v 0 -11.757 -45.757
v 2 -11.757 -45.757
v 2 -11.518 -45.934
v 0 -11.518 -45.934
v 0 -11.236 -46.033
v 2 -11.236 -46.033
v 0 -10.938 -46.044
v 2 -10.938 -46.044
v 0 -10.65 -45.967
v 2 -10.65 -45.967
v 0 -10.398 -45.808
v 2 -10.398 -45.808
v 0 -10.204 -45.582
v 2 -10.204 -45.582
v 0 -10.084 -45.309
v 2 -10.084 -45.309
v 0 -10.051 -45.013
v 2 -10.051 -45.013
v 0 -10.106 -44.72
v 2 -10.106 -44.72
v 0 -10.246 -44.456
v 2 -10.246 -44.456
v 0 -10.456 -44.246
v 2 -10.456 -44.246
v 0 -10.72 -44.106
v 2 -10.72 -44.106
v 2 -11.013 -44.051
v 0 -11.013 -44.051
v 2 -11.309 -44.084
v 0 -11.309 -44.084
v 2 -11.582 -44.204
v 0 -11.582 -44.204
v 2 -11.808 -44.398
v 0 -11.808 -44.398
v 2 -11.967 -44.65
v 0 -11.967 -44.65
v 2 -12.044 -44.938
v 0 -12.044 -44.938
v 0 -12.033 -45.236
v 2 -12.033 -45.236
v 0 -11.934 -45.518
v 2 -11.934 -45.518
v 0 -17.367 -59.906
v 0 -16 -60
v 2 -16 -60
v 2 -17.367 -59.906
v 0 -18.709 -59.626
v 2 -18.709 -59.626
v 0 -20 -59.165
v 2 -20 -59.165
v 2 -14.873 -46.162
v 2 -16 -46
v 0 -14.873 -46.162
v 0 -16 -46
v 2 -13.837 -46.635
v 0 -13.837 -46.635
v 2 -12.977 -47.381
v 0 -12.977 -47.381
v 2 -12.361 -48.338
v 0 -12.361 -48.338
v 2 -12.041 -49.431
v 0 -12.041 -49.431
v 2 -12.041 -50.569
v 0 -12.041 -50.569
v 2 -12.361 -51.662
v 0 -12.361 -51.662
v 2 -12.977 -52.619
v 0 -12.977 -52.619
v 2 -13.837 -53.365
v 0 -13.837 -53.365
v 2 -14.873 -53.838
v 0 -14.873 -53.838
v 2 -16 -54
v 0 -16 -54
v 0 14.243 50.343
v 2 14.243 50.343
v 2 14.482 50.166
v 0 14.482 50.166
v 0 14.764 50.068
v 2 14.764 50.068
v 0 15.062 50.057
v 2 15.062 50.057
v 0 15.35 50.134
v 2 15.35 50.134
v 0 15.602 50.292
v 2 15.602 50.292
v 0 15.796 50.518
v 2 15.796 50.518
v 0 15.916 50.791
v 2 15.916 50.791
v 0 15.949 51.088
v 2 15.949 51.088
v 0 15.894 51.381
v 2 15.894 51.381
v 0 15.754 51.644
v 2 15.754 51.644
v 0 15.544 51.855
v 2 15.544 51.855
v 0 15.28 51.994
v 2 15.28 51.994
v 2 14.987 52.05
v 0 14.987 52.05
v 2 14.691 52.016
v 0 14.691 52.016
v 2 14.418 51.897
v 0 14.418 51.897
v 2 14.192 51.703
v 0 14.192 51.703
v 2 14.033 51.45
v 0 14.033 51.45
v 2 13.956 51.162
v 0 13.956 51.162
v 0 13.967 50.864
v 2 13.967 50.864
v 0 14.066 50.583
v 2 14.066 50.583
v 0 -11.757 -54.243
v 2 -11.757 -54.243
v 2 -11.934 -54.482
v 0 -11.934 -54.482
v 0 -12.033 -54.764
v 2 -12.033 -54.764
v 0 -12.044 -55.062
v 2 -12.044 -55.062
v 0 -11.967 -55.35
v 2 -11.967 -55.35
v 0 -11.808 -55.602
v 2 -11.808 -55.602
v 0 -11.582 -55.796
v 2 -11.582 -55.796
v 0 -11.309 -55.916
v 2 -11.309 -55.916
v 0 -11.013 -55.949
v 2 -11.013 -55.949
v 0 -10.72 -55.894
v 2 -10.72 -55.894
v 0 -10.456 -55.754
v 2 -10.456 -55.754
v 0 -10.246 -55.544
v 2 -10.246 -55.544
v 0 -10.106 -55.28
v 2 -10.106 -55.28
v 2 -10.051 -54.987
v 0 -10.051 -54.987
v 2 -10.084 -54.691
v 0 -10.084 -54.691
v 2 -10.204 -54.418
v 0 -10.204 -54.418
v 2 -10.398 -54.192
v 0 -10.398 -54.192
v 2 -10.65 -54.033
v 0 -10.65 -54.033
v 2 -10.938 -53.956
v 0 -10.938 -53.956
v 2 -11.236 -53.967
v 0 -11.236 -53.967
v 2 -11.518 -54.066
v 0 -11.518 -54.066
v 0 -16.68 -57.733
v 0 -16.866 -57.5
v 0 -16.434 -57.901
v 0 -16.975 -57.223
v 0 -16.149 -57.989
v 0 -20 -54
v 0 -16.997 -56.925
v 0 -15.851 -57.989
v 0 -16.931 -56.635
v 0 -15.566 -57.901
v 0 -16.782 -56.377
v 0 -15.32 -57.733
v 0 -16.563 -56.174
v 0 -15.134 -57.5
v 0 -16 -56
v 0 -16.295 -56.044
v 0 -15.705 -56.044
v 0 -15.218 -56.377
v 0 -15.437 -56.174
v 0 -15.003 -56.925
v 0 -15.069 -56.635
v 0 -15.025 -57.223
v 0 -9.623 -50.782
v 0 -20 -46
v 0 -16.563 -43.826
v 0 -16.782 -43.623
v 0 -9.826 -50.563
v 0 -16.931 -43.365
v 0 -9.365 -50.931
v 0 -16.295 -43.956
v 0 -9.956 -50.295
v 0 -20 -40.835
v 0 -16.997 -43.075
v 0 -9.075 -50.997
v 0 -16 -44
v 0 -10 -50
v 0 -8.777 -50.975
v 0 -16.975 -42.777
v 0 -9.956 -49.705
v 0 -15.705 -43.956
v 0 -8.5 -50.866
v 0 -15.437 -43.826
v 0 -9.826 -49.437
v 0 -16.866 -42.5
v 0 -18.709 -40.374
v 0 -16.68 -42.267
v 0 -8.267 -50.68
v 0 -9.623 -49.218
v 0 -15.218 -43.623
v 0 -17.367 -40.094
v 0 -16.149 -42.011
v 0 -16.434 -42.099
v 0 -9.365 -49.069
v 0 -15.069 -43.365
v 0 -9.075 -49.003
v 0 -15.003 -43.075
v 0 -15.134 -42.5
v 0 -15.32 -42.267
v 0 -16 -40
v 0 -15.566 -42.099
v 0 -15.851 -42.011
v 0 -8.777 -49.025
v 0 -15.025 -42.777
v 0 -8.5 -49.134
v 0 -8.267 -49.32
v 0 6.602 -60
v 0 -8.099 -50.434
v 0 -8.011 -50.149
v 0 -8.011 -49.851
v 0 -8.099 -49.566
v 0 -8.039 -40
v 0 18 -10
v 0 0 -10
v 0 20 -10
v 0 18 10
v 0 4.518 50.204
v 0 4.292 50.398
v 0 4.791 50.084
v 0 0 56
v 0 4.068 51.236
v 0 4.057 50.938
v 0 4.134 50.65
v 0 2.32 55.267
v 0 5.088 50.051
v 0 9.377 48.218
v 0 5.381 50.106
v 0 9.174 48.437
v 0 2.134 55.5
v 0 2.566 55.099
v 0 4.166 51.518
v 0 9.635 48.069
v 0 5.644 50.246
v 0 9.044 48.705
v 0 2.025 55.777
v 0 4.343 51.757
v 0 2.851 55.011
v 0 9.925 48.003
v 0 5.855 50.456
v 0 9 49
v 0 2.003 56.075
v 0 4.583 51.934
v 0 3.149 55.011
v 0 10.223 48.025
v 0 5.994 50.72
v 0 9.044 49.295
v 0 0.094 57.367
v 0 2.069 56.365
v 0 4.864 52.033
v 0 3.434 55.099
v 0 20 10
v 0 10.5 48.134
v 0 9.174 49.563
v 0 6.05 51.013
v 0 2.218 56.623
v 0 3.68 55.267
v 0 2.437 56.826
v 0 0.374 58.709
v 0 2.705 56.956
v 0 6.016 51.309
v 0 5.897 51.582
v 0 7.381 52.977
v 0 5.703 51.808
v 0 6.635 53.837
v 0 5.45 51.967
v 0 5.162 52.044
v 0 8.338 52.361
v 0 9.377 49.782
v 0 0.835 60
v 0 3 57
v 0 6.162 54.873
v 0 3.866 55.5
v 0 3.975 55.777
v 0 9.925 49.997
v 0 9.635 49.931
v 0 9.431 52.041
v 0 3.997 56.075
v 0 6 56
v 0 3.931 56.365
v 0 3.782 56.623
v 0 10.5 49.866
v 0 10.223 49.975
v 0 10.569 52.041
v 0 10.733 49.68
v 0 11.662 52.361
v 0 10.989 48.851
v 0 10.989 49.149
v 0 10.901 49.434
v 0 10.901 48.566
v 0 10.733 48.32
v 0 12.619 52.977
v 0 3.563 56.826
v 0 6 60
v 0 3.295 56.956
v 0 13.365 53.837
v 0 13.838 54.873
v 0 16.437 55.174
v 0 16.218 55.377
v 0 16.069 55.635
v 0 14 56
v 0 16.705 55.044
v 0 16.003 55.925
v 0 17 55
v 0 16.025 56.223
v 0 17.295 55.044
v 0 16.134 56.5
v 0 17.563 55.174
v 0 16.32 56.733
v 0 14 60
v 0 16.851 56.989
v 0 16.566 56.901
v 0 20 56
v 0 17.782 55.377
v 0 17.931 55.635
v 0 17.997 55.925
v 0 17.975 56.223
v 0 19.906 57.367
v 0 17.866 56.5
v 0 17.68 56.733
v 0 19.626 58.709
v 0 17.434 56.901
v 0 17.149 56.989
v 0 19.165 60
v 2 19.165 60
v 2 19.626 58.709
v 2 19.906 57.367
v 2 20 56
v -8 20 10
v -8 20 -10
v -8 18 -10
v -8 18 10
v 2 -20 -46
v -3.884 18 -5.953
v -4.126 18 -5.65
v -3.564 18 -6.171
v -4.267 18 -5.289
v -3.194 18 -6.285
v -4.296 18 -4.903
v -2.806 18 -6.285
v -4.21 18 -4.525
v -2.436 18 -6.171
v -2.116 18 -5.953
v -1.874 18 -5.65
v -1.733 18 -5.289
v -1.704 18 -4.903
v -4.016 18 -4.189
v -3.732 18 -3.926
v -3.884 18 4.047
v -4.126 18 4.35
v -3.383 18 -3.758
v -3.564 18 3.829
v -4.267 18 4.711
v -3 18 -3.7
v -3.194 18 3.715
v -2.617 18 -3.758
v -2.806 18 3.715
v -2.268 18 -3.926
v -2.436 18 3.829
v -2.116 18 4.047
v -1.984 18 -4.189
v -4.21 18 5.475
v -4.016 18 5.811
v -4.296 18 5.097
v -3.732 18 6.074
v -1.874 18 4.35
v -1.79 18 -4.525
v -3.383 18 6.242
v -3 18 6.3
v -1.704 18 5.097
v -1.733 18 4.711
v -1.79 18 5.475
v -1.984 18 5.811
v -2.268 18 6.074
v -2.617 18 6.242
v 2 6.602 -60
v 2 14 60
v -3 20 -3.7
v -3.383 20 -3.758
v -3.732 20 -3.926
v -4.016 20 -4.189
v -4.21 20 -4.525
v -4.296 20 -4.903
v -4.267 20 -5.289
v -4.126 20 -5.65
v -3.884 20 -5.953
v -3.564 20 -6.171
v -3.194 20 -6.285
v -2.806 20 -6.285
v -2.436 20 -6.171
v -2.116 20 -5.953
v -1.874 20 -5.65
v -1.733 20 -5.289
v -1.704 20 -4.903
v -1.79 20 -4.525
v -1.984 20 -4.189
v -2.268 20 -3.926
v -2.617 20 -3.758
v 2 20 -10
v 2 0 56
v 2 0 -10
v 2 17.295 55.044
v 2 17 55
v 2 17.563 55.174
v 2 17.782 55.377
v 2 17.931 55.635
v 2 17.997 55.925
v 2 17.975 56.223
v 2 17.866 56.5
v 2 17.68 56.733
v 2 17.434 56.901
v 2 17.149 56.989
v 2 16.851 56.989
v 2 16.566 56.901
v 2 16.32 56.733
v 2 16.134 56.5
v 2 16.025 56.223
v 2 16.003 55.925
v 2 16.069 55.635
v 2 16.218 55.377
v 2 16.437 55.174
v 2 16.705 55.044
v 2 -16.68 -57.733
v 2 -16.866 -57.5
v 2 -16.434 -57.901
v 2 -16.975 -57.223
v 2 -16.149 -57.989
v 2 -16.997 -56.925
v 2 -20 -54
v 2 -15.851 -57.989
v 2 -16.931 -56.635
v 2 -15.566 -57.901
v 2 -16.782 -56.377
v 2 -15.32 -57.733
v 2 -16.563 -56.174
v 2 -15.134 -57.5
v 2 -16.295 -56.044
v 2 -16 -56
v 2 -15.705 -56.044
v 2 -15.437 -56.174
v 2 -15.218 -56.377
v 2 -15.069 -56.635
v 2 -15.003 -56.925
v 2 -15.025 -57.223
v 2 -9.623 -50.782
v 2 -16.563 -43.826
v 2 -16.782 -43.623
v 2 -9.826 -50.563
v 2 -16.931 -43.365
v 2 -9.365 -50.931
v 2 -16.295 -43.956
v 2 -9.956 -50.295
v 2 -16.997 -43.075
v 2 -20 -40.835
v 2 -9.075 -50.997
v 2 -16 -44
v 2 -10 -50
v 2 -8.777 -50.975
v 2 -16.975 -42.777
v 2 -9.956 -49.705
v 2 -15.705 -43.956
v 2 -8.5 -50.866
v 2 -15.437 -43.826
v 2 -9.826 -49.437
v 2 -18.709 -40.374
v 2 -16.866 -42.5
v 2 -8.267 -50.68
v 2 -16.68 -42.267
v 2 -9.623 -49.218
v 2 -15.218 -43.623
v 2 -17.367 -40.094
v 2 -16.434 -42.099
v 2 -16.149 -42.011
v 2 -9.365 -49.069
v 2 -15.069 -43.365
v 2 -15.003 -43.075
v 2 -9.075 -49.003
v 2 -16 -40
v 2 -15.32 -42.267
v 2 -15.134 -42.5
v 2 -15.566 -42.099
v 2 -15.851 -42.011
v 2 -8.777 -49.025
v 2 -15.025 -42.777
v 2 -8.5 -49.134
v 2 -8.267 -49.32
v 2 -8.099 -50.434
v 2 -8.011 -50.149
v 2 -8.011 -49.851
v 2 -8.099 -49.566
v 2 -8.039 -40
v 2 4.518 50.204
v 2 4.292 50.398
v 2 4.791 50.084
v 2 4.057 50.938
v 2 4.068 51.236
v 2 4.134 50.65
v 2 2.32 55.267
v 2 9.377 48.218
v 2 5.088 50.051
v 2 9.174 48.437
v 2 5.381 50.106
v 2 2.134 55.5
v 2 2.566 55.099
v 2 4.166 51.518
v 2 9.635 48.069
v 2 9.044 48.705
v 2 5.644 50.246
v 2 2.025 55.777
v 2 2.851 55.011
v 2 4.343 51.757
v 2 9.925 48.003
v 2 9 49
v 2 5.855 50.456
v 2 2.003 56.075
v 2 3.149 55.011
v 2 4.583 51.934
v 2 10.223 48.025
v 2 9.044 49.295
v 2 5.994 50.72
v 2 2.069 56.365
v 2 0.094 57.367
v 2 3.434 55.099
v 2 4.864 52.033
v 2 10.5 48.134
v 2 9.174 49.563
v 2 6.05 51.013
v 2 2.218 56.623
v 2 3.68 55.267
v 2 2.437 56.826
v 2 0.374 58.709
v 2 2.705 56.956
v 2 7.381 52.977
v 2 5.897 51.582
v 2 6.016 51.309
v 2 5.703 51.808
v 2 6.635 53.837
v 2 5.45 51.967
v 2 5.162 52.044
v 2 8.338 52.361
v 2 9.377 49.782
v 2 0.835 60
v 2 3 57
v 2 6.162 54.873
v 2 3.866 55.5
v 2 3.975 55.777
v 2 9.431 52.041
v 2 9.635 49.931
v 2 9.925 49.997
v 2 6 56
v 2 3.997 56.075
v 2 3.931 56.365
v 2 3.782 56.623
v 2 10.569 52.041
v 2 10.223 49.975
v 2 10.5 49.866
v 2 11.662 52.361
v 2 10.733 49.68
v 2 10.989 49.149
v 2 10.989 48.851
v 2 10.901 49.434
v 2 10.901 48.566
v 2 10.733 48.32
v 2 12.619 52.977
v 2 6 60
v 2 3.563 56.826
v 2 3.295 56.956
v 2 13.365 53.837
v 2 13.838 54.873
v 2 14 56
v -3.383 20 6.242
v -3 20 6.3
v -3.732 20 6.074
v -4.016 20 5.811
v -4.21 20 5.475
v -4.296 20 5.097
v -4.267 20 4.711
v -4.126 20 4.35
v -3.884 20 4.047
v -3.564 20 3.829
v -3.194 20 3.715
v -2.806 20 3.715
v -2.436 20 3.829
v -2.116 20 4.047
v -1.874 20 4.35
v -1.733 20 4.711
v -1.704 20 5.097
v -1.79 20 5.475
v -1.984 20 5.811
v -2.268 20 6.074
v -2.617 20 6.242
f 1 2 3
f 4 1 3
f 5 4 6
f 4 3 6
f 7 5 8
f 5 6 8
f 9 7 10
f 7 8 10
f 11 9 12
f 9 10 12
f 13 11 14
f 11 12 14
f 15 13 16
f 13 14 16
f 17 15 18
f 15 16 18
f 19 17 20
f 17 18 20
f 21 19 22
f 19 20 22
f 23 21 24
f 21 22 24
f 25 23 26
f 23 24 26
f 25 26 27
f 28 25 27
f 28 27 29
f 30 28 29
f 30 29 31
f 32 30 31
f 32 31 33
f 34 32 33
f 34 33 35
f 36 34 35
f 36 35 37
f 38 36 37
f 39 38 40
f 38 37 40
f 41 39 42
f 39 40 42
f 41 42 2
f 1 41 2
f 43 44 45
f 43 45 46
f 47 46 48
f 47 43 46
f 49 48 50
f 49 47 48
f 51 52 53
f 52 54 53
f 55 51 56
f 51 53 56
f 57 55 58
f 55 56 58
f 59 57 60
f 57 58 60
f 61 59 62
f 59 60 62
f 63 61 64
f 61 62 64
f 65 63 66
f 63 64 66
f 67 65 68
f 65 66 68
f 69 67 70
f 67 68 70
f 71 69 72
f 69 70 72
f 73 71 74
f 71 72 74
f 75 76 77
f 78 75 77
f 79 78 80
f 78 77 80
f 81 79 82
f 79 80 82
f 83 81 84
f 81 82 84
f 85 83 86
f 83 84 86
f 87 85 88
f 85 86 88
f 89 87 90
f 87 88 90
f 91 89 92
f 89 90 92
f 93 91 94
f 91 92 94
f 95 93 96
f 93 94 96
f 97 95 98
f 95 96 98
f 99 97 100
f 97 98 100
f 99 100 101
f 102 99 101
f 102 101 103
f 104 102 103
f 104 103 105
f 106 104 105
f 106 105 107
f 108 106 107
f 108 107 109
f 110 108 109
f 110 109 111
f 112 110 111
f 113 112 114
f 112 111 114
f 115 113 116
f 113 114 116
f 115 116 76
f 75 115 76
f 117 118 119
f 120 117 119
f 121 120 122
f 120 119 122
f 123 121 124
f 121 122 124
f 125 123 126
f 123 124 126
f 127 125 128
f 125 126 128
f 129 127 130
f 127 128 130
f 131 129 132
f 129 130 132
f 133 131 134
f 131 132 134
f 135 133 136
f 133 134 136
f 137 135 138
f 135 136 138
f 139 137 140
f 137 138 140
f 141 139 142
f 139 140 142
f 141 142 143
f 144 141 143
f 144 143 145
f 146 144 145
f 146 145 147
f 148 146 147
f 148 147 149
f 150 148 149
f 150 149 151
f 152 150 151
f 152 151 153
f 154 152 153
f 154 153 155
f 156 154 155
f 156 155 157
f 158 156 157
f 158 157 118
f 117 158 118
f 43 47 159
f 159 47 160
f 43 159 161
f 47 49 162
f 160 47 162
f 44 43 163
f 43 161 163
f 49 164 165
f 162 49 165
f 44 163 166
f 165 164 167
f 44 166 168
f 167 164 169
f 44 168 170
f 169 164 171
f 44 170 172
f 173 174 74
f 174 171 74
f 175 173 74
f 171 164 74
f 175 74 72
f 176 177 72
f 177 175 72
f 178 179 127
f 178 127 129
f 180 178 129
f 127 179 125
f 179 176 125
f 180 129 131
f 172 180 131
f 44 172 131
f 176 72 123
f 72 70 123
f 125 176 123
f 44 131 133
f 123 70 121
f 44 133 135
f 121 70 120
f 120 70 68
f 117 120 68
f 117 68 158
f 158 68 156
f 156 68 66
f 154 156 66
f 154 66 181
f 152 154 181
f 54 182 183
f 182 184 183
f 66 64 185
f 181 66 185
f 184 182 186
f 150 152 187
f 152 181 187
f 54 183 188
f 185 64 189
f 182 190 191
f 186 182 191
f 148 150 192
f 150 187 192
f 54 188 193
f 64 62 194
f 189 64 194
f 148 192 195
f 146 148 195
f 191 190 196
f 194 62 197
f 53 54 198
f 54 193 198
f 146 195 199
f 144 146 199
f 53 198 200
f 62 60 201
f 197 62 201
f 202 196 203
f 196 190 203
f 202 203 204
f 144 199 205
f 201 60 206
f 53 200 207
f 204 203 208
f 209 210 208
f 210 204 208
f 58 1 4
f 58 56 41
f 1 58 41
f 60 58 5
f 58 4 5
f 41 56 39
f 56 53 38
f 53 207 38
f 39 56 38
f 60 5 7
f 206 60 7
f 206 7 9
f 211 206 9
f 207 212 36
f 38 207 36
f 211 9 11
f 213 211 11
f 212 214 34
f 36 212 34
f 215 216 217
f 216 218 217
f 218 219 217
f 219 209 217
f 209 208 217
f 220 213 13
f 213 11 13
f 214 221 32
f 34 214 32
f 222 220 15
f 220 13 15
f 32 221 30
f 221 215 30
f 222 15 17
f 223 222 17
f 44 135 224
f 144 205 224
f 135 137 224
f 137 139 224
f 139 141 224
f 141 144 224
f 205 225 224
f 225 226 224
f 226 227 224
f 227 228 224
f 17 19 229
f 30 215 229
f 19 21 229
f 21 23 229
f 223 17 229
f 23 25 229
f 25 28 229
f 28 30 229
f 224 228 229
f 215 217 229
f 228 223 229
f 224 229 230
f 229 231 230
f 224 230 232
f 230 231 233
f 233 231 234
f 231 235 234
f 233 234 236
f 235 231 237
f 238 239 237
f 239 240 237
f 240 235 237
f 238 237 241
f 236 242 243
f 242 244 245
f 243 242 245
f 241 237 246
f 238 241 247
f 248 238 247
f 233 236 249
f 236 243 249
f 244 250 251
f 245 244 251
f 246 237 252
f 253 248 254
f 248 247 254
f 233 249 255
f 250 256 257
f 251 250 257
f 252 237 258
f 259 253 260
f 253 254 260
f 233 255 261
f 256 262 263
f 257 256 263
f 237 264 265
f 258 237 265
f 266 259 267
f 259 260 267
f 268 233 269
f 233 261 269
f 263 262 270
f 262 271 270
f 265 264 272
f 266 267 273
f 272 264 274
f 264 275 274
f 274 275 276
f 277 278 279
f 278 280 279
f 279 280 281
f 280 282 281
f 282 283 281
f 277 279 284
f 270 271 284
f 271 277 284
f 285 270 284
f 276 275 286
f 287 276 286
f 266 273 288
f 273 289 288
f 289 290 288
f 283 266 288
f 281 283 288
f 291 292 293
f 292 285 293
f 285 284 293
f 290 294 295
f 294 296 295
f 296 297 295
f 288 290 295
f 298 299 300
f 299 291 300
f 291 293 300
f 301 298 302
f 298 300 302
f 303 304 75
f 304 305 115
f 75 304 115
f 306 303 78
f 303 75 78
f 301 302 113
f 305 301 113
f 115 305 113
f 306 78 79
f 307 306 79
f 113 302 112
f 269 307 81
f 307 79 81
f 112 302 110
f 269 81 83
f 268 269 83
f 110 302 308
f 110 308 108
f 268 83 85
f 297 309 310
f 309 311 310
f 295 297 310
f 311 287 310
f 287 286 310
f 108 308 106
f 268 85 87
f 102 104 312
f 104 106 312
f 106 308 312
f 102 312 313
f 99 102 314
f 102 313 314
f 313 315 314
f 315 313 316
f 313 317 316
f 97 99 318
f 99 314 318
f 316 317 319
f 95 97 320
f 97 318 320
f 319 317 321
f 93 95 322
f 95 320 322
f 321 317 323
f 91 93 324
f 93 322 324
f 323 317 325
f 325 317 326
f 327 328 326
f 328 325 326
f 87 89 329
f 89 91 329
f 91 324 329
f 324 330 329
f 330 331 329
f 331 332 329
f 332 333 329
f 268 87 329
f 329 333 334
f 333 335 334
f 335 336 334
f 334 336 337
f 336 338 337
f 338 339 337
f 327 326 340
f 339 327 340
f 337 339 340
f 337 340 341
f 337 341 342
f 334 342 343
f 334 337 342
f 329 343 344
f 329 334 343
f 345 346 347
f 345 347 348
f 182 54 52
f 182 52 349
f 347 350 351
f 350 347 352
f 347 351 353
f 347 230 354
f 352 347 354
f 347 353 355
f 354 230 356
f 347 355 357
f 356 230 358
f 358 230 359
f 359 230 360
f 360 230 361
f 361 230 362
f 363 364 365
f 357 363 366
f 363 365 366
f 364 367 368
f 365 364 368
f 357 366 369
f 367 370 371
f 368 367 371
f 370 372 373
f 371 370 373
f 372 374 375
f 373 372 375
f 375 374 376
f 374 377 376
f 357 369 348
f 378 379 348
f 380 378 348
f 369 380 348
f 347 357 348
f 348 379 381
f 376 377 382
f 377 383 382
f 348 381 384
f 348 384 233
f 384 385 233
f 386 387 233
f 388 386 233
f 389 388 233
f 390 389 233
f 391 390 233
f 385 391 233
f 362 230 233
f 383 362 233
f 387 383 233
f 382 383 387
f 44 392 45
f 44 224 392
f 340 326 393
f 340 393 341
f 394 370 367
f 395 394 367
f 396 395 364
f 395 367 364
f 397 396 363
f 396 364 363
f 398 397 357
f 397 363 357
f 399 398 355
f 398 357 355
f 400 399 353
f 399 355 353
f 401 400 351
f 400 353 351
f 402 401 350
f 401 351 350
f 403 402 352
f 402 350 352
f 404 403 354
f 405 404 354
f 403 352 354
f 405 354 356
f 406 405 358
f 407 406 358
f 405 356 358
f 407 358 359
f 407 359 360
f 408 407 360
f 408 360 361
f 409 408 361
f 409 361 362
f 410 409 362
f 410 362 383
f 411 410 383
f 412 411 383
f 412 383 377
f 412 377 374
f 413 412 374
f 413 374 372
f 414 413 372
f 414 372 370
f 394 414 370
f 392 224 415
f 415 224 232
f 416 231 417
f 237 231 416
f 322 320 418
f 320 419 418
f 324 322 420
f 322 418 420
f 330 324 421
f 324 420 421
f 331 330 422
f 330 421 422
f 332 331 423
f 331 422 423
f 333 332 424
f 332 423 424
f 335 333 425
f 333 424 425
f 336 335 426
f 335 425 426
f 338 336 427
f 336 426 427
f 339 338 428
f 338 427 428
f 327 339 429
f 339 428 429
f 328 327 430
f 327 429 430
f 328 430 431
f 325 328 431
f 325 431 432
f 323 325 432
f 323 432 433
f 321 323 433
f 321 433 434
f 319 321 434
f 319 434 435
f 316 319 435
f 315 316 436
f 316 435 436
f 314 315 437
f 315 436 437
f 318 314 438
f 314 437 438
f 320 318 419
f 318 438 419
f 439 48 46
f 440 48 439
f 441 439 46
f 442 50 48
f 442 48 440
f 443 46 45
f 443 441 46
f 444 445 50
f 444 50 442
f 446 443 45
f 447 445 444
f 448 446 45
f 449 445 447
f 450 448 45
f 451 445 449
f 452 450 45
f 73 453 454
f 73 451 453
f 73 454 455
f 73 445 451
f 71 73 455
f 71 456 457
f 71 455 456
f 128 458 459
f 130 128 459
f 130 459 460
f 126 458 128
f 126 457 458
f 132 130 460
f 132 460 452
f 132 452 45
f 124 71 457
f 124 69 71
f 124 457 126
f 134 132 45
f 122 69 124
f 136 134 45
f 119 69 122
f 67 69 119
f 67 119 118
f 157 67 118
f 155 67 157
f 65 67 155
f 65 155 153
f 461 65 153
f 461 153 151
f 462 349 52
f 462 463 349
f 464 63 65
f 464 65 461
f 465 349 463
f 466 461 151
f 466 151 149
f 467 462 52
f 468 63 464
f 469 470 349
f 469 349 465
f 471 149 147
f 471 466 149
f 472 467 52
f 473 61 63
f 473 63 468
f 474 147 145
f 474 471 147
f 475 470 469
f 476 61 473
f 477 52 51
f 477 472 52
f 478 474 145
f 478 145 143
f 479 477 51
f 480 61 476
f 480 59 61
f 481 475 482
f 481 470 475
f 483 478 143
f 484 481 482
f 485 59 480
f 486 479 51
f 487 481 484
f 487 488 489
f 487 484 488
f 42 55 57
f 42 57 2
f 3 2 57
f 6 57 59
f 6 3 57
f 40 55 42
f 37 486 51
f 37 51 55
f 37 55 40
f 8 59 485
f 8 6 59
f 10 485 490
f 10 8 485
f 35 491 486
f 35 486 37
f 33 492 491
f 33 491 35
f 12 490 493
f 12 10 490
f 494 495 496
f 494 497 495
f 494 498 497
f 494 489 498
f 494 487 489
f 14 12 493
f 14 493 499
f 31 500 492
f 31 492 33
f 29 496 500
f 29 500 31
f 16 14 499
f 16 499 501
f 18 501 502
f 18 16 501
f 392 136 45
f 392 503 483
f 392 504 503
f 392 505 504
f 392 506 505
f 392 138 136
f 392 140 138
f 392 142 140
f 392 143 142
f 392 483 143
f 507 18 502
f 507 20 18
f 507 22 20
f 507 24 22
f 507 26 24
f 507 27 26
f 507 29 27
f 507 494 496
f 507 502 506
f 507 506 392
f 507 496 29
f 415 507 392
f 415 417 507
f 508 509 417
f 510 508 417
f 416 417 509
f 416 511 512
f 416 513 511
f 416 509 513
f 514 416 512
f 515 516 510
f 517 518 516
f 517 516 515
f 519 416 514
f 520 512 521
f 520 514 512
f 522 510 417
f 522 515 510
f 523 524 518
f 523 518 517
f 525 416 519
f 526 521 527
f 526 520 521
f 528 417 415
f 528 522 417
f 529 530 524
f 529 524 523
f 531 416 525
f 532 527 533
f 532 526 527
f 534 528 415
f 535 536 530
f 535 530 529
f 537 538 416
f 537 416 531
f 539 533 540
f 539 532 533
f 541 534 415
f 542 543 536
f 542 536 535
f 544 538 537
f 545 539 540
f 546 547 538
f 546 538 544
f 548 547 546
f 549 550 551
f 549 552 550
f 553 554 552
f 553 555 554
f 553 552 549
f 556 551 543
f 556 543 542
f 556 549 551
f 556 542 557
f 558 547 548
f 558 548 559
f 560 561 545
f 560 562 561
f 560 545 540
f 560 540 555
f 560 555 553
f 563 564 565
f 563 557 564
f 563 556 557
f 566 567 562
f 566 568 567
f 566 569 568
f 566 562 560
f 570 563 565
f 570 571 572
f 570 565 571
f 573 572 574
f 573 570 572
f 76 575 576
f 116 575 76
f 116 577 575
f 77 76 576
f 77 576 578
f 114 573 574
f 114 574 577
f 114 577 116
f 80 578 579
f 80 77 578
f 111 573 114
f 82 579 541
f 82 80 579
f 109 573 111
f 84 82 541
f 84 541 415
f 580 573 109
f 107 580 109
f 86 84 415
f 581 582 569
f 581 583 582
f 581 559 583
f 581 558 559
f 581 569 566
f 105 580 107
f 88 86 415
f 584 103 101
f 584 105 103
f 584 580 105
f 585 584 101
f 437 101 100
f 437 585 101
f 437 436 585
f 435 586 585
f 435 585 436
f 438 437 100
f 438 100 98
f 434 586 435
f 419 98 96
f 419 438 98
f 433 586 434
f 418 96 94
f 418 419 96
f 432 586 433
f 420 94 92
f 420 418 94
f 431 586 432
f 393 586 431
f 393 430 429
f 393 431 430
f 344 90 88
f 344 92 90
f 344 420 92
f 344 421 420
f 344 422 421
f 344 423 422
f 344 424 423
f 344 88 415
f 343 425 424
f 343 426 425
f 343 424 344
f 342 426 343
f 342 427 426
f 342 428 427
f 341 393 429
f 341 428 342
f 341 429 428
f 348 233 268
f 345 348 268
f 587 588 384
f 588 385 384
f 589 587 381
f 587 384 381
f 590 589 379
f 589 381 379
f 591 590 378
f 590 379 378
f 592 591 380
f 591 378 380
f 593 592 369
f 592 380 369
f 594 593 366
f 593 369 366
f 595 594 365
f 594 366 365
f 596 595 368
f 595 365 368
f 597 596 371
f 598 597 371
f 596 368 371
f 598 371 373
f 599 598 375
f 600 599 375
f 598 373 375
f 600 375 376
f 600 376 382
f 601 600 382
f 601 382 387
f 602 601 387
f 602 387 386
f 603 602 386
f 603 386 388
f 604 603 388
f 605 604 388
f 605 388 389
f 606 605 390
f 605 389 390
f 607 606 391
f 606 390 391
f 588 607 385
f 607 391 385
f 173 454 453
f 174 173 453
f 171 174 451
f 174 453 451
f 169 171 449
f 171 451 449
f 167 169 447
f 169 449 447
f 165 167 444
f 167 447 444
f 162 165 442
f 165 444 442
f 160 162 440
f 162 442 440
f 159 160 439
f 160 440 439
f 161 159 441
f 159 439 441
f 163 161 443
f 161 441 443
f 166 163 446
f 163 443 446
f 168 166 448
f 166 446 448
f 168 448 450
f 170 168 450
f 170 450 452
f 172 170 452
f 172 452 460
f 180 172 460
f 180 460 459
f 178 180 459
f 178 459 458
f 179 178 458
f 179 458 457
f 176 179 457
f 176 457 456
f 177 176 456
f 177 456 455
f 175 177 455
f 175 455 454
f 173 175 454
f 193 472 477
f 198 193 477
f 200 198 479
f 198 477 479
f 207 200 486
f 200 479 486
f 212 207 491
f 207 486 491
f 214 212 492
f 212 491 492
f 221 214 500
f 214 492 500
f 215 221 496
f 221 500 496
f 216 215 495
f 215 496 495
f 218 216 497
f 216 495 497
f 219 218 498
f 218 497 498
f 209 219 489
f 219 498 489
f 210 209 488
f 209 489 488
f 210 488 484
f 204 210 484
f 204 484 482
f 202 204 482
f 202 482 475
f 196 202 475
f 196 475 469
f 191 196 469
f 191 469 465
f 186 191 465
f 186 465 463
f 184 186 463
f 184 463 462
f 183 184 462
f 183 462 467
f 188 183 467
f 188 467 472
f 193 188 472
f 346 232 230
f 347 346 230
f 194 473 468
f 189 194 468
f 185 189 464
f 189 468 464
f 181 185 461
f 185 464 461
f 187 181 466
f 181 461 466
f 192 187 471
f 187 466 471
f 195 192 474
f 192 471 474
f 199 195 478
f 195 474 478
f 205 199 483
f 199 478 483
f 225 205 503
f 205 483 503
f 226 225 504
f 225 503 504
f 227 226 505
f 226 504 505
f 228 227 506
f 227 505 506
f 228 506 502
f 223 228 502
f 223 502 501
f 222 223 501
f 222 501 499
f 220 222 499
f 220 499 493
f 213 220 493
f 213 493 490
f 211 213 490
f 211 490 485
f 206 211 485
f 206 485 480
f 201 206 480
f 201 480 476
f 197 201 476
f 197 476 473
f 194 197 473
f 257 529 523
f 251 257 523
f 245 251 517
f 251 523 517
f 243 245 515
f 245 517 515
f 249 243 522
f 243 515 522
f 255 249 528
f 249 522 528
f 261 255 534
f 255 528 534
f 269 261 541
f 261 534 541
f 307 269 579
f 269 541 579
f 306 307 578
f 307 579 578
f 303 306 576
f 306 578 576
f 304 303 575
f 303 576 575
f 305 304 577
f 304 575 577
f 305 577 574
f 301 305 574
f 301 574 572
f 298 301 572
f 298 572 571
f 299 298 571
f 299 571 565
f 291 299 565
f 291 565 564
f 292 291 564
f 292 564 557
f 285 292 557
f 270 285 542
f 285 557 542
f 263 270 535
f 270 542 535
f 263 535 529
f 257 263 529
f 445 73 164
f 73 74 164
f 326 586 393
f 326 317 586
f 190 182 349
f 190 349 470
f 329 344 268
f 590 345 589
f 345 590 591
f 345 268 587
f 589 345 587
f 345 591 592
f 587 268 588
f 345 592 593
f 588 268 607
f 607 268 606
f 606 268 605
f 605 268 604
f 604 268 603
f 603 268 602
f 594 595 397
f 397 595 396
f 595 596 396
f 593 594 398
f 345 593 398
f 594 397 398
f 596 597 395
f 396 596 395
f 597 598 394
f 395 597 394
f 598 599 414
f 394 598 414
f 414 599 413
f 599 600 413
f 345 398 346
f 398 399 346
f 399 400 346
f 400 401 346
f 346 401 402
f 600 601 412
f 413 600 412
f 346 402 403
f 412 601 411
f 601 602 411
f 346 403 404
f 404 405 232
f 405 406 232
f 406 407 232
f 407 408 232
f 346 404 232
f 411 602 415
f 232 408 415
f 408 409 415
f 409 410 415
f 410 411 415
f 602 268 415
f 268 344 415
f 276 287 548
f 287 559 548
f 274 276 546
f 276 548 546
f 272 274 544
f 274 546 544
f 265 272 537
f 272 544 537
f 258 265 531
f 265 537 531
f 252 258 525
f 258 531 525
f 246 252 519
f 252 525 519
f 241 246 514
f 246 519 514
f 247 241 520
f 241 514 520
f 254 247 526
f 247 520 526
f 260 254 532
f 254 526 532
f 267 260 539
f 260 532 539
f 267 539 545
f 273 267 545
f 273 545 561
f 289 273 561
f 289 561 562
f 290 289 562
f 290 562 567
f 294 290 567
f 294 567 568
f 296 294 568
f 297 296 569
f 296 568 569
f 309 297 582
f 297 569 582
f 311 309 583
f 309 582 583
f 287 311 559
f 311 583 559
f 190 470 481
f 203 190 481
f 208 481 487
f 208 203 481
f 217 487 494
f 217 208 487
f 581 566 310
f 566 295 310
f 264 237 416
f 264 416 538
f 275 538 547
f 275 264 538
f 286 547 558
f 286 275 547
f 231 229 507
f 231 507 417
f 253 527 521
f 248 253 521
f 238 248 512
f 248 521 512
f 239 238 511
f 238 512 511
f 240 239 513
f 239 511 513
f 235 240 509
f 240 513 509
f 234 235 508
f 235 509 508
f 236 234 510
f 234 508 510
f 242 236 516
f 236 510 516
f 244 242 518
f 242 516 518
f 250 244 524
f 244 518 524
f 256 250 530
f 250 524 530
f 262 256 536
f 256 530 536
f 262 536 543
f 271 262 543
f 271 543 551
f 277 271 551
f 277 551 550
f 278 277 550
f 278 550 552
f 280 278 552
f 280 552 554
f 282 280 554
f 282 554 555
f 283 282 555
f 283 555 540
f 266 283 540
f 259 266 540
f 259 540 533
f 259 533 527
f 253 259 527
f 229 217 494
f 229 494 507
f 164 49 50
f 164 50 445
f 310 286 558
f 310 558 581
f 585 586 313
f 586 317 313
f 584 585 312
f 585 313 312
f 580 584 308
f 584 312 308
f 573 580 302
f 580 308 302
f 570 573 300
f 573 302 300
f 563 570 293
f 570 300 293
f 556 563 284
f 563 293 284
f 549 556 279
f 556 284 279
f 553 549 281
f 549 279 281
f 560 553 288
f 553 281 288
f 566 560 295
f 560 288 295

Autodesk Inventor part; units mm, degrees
ref_plane "YZ Plane" through (0, 0, 0) normal (1, 0, 0) x (0, 1, 0)
ref_plane "XZ Plane" through (0, 0, 0) normal (0, 1, 0) x (-1, 0, 0)
ref_plane "XY Plane" through (0, 0, 0) normal (0, 0, 1) x (1, 0, 0)
sketch "スケッチ1" plane through (0, 0, 0) normal (1, 0, 0) x (0, 1, 0)
  line L0 (-20, 60) -> (20, 60)
  line L1 (20, 60) -> (20, -60)
  line L2 (20, -60) -> (-20, -60)
  line L3 (-20, -60) -> (-20, 60)
  point P0 (0, 0)
  dimension "d0" = 120
  dimension "d2" = 40
  dimension "d3" = 20
  dimension "d4" = 60
extrude "押し出し1" add sketch "スケッチ1" along normal blind 2
sketch "スケッチ3" plane through (0, 0, 0) normal (-1, 0, 0) x (0, 0, 1)
  line L0 (60, -20) -> (60, 20) projected
  line L1 (60, 20) -> (-60, 20) projected
  line L2 (-60, 20) -> (-60, -20) projected
  line L3 (-60, -20) -> (60, -20) projected
  line L4 (-40, -20) -> (-40, -8.0385)
  line L5 (-40, -8.0385) -> (-10, 0)
  line L6 (-10, 0) -> (60, 0)
  line L7 (60, 0) -> (60, 20)
  line L8 (-60, 6.6025) -> (-10, 20)
  point P0 (0, 0)
  dimension "d11" = 20
  dimension "d12" = 15
  dimension "d13" = 15
  dimension "d14" = 20
  dimension "d15" = 120
  dimension "d17" = 70
  dimension "d18" = 70
extrude "押し出し3" cut sketch "スケッチ3" against normal blind 20 contours L6 L5 L4 L3 L2 L8 L1 L0 keep common part
sketch "スケッチ6" plane through (0, 0, 0) normal (-1, 0, 0) x (0, 0, 1)
  line L0 (-40, -8.0385) -> (-40, -20) projected
  line L1 (-10, 0) -> (-40, -8.0385) projected
  line L2 (60, 0) -> (-10, 0) projected
  line L3 (60, 0) -> (60, 20) projected
  line L4 (60, 20) -> (-10, 20) projected
  line L5 (-60, 6.6025) -> (-10, 20) projected
  line L6 (-60, 6.6025) -> (-60, -20) projected
  line L7 (-60, -20) -> (-40, -20) projected
  arc A0 (-46, -16) -> (-54, -16) centre (-50, -16) ccw
  arc A1 (56, 14) -> (56, 6) centre (56, 10) ccw
  line L8 (-54, -16) -> (-54, -20)
  line L9 (-46, -16) -> (-46, -20)
  line L10 (56, 14) -> (60, 14)
  line L11 (56, 6) -> (60, 6)
  arc A2 (-40.8348, -20) -> (-40, -16) centre (-50, -16) ccw
  arc A3 (-60, -16) -> (-59.1652, -20) centre (-50, -16) ccw
  arc A4 (56, 0) -> (60, 0.8348) centre (56, 10) ccw
  arc A5 (60, 19.1652) -> (56, 20) centre (56, 10) ccw
  point P0 (0, 0)
  dimension "d39" = 8
  dimension "d40" = 4
  dimension "d41" = 4
  dimension "d42" = 10
  dimension "d43" = 10
extrude "押し出し6" cut sketch "スケッチ6" against normal blind 11 contours L0 A2 L7 L9 A0 L8 A3 L6 L5 L4 A5 L3 L10 A1 L11 A4 L2 L1 keep common part
sketch "スケッチ7" plane through (0, 0, 0) normal (-1, 0, 0) x (0, 0, 1)
  arc A0 (60, 19.1652) -> (56, 20) centre (56, 10) ccw projected
  arc A1 (-60, -16) -> (-59.1652, -20) centre (-50, -16) ccw projected
  line L0 (-59.1652, -20) -> (-54, -20) projected
  line L1 (60, 0.8348) -> (60, 6) projected
  circle A2 centre (56, 3) radius 1
  circle A3 centre (-57, -16) radius 1
  point P0 (0, 0)
  dimension "d46" = 2
  dimension "d48" = 7
  dimension "d49" = 4
  dimension "d50" = 4
  dimension "d51" = 7
hole "穴1" at (0, -16, -57) at (0, 3, 56) direction (1, 0, 0) diameter 2 end through all
pattern_circular "円形状パターン1" count 5 over 180 about axis through (0, -16, -50) along (1, 0, 0) of "穴1"
pattern_circular "円形状パターン2" count 5 over 180 about axis through (0, 10, 56) along (1, 0, 0) of "穴1"
sketch "スケッチ9" plane through (0, 0, 0) normal (-1, 0, 0) x (0, 0, 1)
  line L0 (56, 20) -> (-10, 20) projected
  line L1 (60, 14) -> (60, 19.1652) projected
  line L2 (10, 20) -> (-10, 20)
  line L3 (-10, 20) -> (-10, 18)
  line L4 (-10, 18) -> (10, 18)
  line L5 (10, 18) -> (10, 20)
  point P0 (0, 0)
  dimension "d85" = 2
  dimension "d87" = 20
  dimension "d88" = 50
extrude "押し出し8" add sketch "スケッチ9" along normal blind 8
sketch "スケッチ10" plane through (0, 20, 56) normal (0, 1, 0) x (1, 0, 0)
  line L0 (0, 66) -> (-8, 66) projected
  line L1 (-8, 46) -> (-8, 66) projected
  circle A0 centre (-3, 51) radius 1
  circle A1 centre (-3, 61) radius 1
  point P0 (0, 56)
  dimension "d94" = 5
  dimension "d95" = 5
  dimension "d96" = 10
  dimension "d97" = 5
  dimension "d98" = 2
hole "穴3" at (-3, 20, 5) at (-3, 20, -5) direction (0, -1, 0) diameter 2.6 end through all
thread "ねじ5" size "M2.6x0.45" class "6H" standard "ANSI Metric M Profile" full length
thread "ねじ6" size "M2.6x0.45" class "6H" standard "ANSI Metric M Profile" full length
properties part number "10"
